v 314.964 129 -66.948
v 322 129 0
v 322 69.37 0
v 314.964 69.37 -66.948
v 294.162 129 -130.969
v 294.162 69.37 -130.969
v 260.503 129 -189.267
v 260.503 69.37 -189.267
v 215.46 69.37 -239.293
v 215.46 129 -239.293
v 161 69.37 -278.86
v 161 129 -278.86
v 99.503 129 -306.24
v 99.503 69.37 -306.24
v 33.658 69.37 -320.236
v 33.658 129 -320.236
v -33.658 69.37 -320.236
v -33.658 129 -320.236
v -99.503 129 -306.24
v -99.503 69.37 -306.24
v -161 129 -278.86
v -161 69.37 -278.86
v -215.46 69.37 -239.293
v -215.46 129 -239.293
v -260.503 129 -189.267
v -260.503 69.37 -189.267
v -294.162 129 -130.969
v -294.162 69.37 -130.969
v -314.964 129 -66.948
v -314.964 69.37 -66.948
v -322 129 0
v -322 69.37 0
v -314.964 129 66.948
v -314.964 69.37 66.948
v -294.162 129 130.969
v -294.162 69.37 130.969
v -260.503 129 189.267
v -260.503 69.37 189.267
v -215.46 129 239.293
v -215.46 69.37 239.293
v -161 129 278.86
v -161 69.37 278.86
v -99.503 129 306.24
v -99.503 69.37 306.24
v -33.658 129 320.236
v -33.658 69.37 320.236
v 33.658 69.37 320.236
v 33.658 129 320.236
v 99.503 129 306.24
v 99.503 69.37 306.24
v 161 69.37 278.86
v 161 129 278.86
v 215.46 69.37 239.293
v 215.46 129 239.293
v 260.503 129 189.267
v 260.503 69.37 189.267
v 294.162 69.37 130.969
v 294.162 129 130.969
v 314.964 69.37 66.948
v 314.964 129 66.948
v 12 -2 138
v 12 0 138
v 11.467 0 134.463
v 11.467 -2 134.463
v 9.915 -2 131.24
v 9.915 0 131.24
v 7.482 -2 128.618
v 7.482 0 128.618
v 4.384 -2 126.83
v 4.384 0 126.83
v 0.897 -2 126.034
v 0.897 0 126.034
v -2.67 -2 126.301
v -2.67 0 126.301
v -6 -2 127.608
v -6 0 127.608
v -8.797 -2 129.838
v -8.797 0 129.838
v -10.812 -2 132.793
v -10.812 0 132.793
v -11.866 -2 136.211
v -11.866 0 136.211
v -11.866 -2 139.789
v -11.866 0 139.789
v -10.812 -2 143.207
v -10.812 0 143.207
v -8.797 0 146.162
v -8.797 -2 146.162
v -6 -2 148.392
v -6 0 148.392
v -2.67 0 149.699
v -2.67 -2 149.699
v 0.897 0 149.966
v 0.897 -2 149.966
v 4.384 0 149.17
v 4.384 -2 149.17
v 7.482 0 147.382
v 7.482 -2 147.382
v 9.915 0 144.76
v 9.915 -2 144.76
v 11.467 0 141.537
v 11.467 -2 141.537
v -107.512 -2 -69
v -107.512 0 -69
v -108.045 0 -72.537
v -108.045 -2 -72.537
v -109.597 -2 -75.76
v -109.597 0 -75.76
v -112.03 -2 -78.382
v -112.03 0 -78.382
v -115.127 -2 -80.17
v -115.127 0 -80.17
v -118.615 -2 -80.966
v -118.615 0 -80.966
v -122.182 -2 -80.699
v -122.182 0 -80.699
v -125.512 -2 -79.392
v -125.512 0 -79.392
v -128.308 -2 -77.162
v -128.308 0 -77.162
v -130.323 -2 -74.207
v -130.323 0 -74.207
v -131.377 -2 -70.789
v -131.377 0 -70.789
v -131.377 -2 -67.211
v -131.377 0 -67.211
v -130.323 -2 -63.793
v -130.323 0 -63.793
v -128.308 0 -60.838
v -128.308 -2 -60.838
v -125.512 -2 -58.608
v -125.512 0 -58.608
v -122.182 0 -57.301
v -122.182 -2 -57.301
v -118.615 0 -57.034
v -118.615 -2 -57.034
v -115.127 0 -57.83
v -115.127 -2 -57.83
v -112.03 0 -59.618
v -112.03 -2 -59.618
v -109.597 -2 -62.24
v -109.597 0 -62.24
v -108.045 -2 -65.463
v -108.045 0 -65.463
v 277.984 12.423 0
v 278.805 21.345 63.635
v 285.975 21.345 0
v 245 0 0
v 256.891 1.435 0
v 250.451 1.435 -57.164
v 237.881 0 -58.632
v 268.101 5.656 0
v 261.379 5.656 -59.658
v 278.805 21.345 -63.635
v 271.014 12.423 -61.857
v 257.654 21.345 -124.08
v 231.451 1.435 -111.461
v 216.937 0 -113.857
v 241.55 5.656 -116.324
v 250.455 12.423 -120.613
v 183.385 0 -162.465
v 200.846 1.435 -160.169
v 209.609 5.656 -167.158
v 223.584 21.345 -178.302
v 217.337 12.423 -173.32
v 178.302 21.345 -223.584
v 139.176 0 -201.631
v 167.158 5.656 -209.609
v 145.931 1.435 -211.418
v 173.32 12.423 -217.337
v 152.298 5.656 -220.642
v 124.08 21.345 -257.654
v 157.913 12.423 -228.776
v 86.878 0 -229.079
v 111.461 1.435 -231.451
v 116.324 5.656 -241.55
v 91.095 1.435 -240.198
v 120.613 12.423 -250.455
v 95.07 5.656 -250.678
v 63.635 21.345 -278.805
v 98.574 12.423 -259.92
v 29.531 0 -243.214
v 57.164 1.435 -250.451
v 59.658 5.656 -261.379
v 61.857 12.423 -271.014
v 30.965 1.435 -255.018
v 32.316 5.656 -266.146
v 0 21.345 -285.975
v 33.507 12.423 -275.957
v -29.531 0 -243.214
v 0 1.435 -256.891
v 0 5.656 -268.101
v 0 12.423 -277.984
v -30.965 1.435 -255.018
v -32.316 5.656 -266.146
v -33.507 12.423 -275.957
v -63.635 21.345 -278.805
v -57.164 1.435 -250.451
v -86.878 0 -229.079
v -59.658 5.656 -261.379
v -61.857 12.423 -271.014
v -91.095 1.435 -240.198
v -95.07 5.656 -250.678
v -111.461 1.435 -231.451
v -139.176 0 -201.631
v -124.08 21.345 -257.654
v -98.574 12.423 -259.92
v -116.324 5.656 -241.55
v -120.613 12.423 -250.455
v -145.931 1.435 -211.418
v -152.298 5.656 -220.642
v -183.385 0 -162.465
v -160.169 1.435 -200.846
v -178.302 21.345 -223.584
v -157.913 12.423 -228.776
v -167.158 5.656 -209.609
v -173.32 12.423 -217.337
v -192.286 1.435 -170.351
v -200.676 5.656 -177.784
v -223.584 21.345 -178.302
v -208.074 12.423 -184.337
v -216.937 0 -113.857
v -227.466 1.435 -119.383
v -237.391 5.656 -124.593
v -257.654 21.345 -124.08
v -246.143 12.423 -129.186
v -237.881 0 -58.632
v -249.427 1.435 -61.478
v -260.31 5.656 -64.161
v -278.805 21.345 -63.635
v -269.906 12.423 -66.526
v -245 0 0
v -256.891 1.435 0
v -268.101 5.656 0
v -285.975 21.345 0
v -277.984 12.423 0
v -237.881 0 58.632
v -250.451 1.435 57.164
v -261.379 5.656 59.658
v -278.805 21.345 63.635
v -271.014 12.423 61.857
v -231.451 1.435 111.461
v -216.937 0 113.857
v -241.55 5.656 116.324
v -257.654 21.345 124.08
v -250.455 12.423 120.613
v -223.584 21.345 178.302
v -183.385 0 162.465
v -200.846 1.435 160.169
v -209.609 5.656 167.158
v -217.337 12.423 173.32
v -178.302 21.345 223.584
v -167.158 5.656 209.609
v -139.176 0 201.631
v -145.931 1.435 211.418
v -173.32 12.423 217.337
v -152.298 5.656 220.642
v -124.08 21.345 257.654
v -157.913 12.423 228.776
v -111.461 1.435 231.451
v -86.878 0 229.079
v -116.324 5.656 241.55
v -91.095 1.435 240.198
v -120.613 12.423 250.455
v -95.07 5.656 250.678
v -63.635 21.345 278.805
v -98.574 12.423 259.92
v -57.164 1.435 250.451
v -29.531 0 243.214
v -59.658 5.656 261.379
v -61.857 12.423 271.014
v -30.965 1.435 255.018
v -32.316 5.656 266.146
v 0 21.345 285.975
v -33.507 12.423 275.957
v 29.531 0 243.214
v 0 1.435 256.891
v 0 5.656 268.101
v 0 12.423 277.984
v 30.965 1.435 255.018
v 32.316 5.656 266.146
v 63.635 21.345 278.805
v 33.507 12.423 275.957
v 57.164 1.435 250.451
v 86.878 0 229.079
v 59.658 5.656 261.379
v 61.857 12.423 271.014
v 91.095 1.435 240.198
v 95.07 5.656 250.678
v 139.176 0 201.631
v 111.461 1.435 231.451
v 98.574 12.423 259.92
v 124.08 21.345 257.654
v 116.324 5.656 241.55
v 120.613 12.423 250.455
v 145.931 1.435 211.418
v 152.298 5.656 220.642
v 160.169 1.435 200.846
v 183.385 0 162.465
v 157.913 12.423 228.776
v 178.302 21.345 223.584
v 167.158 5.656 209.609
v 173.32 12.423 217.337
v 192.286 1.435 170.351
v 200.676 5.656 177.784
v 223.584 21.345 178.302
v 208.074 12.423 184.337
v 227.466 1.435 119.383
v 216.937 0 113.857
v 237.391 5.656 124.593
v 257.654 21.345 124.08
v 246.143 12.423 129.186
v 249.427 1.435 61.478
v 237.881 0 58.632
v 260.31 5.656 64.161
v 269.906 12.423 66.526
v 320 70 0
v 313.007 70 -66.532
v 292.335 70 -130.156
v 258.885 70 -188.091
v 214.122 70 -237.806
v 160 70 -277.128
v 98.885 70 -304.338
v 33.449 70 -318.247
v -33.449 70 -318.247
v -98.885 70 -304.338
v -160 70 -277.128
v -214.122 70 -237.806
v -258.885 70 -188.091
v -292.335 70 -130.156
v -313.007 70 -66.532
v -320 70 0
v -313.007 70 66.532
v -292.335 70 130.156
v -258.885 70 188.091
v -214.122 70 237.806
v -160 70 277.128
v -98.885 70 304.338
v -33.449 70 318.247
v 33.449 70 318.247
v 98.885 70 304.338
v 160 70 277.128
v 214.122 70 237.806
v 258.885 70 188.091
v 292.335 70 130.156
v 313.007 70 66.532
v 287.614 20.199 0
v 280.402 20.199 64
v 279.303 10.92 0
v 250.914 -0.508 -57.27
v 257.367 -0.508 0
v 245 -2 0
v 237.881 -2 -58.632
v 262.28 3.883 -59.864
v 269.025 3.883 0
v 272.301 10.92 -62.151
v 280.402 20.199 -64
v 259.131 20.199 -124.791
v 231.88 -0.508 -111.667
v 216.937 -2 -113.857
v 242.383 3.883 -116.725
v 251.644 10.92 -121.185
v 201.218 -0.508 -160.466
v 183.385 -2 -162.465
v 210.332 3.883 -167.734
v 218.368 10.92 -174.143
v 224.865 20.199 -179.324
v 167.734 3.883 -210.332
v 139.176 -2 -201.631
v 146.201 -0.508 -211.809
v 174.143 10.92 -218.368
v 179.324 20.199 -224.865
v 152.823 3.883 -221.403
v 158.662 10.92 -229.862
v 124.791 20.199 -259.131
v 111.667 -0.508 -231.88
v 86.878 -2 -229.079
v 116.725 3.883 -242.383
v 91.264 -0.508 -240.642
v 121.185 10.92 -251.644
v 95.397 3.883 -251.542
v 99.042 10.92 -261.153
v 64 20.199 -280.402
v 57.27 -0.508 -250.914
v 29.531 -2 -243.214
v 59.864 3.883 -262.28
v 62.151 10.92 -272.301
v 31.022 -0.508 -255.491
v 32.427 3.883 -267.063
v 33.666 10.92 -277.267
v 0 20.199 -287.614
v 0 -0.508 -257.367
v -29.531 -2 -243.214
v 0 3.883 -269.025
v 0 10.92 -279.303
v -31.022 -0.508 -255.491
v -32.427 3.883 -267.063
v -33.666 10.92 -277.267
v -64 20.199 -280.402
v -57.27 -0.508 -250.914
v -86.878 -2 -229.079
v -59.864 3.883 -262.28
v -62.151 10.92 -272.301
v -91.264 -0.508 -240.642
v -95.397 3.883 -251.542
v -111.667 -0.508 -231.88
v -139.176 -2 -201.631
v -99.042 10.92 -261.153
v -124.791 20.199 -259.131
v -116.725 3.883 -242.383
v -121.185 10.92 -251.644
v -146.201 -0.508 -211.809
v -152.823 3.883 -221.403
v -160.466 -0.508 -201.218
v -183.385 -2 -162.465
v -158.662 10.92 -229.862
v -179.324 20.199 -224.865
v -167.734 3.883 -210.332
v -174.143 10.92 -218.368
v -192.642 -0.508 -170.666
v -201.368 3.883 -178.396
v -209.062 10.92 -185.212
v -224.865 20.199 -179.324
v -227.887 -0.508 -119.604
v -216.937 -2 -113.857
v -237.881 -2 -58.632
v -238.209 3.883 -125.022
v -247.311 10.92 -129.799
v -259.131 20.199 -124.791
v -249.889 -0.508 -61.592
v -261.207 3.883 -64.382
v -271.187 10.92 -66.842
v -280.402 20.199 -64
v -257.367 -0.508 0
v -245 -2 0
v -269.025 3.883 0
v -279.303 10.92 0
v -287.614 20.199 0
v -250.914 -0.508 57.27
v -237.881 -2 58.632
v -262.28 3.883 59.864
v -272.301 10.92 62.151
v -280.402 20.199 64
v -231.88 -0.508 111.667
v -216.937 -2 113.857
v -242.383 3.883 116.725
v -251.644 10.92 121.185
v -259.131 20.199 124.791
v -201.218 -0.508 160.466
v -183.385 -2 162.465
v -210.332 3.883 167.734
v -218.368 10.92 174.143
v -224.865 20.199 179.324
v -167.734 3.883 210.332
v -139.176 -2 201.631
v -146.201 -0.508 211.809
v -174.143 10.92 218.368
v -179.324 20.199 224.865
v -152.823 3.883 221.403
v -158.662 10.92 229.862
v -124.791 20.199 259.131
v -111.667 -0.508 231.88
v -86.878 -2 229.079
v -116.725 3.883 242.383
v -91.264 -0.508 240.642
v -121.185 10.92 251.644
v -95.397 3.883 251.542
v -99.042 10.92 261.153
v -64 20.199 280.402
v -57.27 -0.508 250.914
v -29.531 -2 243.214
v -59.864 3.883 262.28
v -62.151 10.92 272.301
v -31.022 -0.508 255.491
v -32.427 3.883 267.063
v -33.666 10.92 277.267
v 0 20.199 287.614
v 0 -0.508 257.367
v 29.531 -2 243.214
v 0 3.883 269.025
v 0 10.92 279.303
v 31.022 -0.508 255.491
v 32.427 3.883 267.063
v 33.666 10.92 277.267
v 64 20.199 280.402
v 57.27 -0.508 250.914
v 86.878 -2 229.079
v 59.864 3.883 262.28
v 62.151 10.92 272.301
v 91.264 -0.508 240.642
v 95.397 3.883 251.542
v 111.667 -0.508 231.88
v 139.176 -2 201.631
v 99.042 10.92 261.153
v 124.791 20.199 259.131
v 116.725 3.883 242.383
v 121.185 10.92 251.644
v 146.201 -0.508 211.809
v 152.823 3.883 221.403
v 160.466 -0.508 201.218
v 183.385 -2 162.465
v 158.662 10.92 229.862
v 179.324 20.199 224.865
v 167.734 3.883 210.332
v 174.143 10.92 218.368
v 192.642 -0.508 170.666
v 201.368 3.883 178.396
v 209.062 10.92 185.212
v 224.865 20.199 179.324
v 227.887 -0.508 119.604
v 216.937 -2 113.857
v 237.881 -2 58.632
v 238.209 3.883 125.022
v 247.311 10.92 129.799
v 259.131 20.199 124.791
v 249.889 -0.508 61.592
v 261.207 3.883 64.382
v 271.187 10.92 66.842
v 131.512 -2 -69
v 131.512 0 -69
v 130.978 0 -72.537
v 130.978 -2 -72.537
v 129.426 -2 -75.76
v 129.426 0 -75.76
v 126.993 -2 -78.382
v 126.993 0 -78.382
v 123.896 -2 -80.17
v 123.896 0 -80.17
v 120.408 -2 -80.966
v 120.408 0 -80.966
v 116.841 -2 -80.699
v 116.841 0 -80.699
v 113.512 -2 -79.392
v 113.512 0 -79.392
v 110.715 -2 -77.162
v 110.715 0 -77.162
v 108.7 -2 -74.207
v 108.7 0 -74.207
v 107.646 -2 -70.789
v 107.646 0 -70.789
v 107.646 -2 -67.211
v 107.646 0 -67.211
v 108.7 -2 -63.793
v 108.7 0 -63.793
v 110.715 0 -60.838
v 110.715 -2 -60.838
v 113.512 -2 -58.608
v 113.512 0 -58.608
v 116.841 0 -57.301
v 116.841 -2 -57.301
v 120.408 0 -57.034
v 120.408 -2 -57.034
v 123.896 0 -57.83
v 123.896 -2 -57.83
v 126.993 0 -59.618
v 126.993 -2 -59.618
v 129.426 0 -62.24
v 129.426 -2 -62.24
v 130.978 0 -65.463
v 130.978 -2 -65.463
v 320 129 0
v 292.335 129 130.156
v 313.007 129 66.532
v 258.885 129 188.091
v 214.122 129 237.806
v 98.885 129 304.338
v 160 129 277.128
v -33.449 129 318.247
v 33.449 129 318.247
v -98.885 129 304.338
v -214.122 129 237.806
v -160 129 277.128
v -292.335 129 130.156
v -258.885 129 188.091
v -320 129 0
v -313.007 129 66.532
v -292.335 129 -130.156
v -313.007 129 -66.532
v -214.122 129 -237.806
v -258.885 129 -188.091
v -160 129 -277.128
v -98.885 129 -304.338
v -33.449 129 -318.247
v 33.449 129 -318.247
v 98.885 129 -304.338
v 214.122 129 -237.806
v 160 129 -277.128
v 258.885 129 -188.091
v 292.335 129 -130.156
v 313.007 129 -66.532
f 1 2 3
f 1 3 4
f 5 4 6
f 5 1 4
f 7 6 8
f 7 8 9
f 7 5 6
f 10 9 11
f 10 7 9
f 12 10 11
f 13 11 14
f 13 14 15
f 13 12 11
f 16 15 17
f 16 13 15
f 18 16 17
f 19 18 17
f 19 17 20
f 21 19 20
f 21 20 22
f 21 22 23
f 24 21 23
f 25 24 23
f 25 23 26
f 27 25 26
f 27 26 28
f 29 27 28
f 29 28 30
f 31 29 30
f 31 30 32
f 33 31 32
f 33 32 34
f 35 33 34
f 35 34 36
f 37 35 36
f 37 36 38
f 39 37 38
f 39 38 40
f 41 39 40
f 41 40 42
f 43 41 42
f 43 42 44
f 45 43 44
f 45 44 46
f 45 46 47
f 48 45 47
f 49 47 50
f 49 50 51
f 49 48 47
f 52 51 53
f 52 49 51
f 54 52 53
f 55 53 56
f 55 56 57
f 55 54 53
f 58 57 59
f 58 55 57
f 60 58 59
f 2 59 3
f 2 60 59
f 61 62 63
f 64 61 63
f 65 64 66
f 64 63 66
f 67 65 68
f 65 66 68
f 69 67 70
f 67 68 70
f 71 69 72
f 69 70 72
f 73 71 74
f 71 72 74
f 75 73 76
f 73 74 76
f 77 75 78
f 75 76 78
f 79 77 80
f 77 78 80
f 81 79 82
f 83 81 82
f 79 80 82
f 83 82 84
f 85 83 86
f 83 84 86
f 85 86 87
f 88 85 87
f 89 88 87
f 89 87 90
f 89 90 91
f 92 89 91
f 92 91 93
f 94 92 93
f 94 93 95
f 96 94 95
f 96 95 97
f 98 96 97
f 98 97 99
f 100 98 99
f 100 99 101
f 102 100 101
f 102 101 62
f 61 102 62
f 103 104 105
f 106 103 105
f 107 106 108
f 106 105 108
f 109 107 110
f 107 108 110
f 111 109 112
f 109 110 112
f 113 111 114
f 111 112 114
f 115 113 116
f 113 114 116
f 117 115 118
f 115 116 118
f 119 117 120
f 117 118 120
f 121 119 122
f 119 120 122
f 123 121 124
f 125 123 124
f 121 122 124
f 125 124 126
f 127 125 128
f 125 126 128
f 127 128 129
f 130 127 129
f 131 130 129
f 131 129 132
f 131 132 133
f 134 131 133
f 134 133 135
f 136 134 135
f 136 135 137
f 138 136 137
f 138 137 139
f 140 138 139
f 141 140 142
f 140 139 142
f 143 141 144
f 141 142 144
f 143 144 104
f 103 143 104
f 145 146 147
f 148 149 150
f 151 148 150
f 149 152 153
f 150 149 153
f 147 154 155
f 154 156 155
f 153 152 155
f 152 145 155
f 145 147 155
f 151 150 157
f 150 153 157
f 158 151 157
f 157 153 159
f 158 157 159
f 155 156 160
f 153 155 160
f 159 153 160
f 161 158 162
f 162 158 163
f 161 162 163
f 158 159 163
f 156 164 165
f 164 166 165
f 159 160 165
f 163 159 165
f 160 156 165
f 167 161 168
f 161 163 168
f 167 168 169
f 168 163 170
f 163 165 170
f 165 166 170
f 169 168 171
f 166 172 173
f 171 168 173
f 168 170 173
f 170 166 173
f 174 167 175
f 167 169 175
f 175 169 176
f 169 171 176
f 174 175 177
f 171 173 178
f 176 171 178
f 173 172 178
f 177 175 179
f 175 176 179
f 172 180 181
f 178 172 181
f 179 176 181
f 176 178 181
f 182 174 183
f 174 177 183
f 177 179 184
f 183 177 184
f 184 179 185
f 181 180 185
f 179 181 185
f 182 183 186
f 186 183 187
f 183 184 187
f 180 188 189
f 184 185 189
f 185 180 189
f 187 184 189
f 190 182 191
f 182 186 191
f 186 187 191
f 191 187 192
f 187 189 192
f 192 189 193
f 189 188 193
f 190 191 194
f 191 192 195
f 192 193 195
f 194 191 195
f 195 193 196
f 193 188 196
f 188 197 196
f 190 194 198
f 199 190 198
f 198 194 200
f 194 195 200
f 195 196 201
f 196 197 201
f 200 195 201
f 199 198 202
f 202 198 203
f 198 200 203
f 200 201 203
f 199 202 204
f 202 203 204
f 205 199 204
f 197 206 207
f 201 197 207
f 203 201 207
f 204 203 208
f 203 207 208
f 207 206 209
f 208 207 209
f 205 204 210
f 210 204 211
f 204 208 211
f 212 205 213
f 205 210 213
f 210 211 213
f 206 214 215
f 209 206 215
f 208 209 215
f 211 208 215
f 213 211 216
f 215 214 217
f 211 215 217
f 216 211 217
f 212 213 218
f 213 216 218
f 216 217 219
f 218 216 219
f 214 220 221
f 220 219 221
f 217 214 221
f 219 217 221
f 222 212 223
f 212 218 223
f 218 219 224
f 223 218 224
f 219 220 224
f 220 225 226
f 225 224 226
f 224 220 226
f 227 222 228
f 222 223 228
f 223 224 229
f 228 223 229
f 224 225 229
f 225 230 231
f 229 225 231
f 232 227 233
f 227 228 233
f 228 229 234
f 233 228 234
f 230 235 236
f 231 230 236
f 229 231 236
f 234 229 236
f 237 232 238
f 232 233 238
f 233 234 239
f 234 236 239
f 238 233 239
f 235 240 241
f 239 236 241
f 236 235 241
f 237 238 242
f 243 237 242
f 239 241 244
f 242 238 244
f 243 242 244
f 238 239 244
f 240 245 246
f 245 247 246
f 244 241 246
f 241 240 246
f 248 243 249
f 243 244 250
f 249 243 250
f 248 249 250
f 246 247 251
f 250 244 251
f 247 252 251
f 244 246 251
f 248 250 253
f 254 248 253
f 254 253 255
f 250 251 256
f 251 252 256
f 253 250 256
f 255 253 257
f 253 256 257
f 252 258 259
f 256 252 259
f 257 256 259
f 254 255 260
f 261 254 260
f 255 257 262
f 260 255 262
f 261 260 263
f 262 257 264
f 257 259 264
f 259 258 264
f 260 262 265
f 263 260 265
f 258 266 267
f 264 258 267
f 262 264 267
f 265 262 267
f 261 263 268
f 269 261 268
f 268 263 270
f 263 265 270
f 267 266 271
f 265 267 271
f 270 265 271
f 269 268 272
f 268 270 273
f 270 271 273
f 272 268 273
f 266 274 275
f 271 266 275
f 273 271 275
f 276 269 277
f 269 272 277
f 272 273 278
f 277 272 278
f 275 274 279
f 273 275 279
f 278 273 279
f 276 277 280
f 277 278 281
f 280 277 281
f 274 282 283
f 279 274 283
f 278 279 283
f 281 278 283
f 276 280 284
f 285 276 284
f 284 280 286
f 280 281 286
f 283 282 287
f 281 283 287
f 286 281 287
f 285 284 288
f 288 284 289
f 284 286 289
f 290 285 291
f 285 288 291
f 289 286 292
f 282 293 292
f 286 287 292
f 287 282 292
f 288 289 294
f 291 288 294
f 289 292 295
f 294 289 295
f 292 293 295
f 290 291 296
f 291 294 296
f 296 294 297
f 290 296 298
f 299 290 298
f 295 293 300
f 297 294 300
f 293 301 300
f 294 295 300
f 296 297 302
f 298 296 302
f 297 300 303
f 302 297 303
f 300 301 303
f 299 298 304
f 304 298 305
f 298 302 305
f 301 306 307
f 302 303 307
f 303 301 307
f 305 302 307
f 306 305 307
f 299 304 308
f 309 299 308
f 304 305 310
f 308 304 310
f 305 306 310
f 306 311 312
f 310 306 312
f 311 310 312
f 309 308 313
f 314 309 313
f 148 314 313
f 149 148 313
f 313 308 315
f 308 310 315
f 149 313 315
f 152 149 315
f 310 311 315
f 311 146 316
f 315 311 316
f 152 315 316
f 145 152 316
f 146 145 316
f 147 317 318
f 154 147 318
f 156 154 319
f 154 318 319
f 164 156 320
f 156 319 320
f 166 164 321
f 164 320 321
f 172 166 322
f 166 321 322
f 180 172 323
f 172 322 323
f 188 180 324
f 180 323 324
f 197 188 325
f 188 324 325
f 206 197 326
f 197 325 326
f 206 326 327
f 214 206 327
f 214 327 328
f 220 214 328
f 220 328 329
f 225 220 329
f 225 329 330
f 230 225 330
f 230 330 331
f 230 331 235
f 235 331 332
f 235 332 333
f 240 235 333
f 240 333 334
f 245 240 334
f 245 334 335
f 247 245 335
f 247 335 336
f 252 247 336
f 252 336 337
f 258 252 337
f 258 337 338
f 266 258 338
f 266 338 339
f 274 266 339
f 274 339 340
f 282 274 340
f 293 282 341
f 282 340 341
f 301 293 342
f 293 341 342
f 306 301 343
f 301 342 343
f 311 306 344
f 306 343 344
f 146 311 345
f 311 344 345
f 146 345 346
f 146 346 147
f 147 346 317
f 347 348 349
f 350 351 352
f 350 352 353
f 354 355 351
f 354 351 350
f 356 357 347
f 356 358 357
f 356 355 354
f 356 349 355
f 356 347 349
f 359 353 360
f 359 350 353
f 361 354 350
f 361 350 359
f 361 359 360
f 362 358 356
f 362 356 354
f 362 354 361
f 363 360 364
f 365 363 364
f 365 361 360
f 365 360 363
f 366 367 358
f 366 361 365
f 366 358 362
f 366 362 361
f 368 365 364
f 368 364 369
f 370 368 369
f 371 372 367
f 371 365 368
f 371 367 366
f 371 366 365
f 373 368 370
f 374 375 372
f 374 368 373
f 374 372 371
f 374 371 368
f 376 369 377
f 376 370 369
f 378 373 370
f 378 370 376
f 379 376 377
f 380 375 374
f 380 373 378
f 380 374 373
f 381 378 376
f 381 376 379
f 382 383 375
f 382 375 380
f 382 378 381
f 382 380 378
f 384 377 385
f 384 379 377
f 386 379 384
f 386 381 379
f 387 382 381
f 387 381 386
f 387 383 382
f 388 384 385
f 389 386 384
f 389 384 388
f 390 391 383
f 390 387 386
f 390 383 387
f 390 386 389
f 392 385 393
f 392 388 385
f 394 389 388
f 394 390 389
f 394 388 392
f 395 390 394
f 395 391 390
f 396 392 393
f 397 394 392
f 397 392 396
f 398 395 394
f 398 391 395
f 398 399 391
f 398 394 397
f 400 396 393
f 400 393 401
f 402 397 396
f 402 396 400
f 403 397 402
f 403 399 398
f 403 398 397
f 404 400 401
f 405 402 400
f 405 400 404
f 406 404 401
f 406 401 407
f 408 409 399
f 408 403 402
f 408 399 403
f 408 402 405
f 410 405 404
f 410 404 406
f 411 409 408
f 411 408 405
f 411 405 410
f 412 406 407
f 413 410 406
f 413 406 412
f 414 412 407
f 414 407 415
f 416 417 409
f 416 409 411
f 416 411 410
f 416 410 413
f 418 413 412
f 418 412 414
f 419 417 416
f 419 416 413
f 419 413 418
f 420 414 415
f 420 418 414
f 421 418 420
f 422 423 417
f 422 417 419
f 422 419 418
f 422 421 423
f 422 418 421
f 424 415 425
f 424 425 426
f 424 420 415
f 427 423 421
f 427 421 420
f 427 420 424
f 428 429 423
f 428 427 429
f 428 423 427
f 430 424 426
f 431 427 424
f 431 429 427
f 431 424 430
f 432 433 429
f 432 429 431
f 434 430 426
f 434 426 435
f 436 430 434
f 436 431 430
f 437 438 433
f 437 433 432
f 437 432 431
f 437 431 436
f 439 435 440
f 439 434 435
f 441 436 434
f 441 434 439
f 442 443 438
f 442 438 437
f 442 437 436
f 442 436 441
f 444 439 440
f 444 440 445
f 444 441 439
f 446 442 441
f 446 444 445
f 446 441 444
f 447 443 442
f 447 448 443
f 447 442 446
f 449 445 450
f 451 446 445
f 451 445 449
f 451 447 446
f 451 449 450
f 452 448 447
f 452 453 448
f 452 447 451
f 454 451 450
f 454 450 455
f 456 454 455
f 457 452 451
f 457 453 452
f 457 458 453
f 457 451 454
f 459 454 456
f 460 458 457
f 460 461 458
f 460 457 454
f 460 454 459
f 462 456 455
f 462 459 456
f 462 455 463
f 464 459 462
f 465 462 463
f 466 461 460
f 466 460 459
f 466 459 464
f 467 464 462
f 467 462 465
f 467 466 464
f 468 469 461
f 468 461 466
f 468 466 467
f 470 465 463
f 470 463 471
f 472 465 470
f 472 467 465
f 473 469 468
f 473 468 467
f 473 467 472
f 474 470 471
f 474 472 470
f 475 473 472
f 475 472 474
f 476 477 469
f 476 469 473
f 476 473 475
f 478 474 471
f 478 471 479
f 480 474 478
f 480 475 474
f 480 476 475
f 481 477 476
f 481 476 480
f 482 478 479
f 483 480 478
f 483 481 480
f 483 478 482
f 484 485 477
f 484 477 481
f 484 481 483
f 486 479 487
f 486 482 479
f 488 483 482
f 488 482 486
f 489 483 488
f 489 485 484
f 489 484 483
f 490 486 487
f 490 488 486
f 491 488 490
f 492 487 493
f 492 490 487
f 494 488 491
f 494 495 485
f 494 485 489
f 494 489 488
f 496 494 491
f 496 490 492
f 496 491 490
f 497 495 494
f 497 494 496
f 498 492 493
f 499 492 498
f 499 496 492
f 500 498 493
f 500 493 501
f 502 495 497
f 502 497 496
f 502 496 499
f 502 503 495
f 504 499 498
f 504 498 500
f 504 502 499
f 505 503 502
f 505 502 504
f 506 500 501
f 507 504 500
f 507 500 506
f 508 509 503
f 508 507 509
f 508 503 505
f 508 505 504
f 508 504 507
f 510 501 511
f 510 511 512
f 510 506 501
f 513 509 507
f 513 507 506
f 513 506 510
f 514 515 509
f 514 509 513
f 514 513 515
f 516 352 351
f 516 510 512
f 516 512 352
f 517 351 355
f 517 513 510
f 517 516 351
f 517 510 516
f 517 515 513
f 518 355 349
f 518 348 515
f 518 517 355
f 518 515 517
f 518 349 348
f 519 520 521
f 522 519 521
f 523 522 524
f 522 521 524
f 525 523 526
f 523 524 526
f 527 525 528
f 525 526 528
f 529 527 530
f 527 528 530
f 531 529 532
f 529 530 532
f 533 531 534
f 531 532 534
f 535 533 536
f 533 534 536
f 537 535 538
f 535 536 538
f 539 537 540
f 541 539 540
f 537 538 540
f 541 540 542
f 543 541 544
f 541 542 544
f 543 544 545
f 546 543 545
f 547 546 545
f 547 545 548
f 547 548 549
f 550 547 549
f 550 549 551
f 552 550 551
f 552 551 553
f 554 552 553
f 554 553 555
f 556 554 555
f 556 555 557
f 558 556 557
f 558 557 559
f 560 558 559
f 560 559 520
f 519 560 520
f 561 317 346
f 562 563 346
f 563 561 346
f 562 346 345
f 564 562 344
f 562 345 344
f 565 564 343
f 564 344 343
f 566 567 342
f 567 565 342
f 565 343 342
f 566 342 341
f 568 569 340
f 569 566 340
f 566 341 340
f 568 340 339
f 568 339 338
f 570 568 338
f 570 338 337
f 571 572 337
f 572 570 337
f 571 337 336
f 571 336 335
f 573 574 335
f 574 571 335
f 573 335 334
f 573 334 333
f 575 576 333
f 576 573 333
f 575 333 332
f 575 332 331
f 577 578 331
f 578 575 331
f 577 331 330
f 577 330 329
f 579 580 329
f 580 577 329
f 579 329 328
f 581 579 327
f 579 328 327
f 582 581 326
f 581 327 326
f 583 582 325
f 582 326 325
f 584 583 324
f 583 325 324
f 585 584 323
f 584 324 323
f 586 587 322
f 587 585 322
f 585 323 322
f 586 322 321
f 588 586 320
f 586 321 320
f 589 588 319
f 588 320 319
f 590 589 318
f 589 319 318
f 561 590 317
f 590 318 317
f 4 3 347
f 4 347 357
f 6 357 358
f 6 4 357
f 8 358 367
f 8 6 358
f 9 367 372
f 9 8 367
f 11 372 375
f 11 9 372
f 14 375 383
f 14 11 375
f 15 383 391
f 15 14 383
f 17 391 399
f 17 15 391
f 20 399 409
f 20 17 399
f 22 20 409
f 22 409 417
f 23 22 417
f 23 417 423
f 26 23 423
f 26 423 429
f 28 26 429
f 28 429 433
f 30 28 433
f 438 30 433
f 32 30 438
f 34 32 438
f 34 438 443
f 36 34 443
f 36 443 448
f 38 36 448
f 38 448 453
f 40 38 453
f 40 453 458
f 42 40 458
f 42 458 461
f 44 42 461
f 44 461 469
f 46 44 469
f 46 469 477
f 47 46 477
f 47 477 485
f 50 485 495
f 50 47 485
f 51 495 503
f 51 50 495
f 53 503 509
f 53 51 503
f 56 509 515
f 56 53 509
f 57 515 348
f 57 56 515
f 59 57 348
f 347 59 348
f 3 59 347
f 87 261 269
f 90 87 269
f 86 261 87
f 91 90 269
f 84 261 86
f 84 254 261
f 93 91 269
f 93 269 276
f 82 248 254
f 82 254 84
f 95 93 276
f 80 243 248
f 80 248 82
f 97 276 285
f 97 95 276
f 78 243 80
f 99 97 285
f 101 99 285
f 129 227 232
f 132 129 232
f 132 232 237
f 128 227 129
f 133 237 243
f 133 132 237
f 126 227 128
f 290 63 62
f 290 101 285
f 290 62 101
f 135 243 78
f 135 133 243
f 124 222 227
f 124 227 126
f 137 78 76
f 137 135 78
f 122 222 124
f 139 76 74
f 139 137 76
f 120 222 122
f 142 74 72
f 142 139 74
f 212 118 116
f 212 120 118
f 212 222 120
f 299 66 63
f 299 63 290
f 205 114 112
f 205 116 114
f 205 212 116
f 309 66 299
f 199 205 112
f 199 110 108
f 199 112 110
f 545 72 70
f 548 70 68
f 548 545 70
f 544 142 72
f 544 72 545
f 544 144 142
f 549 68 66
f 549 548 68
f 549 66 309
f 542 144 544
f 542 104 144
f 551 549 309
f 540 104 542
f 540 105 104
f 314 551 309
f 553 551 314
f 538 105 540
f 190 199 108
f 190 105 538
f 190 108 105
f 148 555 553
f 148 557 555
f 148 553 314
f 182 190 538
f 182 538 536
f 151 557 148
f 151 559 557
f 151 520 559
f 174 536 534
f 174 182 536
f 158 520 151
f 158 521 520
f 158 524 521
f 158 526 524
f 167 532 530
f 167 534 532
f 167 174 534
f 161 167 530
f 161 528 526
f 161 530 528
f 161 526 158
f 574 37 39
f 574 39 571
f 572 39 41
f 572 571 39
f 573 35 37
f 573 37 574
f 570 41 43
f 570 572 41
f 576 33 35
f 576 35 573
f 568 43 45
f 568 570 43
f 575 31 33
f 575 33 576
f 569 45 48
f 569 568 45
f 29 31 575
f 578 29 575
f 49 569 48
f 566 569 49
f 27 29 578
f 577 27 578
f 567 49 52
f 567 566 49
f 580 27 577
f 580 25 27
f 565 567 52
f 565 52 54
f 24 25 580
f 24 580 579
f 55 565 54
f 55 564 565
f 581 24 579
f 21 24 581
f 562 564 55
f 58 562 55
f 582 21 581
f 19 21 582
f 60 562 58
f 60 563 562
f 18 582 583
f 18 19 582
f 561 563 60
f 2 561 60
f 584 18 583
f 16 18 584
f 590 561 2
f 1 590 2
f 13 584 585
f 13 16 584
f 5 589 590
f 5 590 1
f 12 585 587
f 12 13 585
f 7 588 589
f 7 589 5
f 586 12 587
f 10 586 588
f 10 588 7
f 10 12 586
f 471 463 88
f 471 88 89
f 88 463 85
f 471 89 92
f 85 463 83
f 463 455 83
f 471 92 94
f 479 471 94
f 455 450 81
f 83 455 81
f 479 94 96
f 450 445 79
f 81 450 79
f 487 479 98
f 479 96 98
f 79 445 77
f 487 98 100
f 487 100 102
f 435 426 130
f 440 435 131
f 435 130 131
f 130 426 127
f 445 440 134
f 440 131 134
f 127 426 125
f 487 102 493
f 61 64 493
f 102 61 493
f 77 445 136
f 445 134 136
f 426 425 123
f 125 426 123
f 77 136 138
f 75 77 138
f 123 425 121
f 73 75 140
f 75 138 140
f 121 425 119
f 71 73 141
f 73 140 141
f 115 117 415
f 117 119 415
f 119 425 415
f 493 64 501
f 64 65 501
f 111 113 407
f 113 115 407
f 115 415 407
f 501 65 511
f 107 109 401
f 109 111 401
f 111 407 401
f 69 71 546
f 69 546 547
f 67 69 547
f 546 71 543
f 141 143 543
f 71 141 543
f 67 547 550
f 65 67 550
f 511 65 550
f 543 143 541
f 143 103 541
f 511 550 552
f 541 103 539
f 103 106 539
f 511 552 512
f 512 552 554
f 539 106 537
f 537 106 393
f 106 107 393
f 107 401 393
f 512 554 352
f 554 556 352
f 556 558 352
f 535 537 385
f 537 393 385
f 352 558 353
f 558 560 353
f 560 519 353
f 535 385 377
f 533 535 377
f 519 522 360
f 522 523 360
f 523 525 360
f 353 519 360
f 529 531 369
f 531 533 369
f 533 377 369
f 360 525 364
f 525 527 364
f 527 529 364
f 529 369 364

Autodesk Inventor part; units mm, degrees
ref_plane "YZ Plane" through (0, 0, 0) normal (1, 0, 0) x (0, 1, 0)
ref_plane "XZ Plane" through (0, 0, 0) normal (0, 1, 0) x (-1, 0, 0)
ref_plane "XY Plane" through (0, 0, 0) normal (0, 0, 1) x (1, 0, 0)
sketch "Sketch1" plane through (0, 0, 0) normal (0, 0, 1) x (1, 0, 0)
  line L0 (320, 126) -> (320, 70)
  line L1 (320, 70) -> (285.9746, 21.3454)
  arc A0 (245, 0) -> (285.9746, 21.3454) centre (245, 50) ccw
  line L2 (245, 0) -> (0, 0)
  line L3 (320, 129) -> (320, 126)
  line L4 (0, -2) -> (245, -2)
  arc A1 (245, -2) -> (287.6135, 20.1992) centre (245, 50) ccw
  line L5 (287.6135, 20.1992) -> (322, 69.3701)
  line L6 (322, 69.3701) -> (322, 126)
  line L7 (322, 126) -> (322, 129)
  line L8 (322, 129) -> (320, 129)
  line L9 (0, -25.8) -> (0, 154.8) construction
  line L10 (0, 0) -> (0, -2)
  point P0 (0, 0)
  dimension "d0" = 2
  dimension "d1" = 30.4542
revolve "Revolution1" add sketch "Sketch1" angle 360 about axis through (0, -25.8, 0) along (0, 1, 0)
sketch "Sketch2" plane through (0, 0, 0) normal (0, 1, 0) x (1, 0, 0)
  circle A0 centre (0, -138) radius 12 projected
  circle A1 centre (119.5115, 69) radius 12 projected
  circle A2 centre (-119.5115, 69) radius 12 projected
  point P0 (0, 0)
extrude "Extrusion1" cut sketch "Sketch2" against normal through all
properties part number "coating"
